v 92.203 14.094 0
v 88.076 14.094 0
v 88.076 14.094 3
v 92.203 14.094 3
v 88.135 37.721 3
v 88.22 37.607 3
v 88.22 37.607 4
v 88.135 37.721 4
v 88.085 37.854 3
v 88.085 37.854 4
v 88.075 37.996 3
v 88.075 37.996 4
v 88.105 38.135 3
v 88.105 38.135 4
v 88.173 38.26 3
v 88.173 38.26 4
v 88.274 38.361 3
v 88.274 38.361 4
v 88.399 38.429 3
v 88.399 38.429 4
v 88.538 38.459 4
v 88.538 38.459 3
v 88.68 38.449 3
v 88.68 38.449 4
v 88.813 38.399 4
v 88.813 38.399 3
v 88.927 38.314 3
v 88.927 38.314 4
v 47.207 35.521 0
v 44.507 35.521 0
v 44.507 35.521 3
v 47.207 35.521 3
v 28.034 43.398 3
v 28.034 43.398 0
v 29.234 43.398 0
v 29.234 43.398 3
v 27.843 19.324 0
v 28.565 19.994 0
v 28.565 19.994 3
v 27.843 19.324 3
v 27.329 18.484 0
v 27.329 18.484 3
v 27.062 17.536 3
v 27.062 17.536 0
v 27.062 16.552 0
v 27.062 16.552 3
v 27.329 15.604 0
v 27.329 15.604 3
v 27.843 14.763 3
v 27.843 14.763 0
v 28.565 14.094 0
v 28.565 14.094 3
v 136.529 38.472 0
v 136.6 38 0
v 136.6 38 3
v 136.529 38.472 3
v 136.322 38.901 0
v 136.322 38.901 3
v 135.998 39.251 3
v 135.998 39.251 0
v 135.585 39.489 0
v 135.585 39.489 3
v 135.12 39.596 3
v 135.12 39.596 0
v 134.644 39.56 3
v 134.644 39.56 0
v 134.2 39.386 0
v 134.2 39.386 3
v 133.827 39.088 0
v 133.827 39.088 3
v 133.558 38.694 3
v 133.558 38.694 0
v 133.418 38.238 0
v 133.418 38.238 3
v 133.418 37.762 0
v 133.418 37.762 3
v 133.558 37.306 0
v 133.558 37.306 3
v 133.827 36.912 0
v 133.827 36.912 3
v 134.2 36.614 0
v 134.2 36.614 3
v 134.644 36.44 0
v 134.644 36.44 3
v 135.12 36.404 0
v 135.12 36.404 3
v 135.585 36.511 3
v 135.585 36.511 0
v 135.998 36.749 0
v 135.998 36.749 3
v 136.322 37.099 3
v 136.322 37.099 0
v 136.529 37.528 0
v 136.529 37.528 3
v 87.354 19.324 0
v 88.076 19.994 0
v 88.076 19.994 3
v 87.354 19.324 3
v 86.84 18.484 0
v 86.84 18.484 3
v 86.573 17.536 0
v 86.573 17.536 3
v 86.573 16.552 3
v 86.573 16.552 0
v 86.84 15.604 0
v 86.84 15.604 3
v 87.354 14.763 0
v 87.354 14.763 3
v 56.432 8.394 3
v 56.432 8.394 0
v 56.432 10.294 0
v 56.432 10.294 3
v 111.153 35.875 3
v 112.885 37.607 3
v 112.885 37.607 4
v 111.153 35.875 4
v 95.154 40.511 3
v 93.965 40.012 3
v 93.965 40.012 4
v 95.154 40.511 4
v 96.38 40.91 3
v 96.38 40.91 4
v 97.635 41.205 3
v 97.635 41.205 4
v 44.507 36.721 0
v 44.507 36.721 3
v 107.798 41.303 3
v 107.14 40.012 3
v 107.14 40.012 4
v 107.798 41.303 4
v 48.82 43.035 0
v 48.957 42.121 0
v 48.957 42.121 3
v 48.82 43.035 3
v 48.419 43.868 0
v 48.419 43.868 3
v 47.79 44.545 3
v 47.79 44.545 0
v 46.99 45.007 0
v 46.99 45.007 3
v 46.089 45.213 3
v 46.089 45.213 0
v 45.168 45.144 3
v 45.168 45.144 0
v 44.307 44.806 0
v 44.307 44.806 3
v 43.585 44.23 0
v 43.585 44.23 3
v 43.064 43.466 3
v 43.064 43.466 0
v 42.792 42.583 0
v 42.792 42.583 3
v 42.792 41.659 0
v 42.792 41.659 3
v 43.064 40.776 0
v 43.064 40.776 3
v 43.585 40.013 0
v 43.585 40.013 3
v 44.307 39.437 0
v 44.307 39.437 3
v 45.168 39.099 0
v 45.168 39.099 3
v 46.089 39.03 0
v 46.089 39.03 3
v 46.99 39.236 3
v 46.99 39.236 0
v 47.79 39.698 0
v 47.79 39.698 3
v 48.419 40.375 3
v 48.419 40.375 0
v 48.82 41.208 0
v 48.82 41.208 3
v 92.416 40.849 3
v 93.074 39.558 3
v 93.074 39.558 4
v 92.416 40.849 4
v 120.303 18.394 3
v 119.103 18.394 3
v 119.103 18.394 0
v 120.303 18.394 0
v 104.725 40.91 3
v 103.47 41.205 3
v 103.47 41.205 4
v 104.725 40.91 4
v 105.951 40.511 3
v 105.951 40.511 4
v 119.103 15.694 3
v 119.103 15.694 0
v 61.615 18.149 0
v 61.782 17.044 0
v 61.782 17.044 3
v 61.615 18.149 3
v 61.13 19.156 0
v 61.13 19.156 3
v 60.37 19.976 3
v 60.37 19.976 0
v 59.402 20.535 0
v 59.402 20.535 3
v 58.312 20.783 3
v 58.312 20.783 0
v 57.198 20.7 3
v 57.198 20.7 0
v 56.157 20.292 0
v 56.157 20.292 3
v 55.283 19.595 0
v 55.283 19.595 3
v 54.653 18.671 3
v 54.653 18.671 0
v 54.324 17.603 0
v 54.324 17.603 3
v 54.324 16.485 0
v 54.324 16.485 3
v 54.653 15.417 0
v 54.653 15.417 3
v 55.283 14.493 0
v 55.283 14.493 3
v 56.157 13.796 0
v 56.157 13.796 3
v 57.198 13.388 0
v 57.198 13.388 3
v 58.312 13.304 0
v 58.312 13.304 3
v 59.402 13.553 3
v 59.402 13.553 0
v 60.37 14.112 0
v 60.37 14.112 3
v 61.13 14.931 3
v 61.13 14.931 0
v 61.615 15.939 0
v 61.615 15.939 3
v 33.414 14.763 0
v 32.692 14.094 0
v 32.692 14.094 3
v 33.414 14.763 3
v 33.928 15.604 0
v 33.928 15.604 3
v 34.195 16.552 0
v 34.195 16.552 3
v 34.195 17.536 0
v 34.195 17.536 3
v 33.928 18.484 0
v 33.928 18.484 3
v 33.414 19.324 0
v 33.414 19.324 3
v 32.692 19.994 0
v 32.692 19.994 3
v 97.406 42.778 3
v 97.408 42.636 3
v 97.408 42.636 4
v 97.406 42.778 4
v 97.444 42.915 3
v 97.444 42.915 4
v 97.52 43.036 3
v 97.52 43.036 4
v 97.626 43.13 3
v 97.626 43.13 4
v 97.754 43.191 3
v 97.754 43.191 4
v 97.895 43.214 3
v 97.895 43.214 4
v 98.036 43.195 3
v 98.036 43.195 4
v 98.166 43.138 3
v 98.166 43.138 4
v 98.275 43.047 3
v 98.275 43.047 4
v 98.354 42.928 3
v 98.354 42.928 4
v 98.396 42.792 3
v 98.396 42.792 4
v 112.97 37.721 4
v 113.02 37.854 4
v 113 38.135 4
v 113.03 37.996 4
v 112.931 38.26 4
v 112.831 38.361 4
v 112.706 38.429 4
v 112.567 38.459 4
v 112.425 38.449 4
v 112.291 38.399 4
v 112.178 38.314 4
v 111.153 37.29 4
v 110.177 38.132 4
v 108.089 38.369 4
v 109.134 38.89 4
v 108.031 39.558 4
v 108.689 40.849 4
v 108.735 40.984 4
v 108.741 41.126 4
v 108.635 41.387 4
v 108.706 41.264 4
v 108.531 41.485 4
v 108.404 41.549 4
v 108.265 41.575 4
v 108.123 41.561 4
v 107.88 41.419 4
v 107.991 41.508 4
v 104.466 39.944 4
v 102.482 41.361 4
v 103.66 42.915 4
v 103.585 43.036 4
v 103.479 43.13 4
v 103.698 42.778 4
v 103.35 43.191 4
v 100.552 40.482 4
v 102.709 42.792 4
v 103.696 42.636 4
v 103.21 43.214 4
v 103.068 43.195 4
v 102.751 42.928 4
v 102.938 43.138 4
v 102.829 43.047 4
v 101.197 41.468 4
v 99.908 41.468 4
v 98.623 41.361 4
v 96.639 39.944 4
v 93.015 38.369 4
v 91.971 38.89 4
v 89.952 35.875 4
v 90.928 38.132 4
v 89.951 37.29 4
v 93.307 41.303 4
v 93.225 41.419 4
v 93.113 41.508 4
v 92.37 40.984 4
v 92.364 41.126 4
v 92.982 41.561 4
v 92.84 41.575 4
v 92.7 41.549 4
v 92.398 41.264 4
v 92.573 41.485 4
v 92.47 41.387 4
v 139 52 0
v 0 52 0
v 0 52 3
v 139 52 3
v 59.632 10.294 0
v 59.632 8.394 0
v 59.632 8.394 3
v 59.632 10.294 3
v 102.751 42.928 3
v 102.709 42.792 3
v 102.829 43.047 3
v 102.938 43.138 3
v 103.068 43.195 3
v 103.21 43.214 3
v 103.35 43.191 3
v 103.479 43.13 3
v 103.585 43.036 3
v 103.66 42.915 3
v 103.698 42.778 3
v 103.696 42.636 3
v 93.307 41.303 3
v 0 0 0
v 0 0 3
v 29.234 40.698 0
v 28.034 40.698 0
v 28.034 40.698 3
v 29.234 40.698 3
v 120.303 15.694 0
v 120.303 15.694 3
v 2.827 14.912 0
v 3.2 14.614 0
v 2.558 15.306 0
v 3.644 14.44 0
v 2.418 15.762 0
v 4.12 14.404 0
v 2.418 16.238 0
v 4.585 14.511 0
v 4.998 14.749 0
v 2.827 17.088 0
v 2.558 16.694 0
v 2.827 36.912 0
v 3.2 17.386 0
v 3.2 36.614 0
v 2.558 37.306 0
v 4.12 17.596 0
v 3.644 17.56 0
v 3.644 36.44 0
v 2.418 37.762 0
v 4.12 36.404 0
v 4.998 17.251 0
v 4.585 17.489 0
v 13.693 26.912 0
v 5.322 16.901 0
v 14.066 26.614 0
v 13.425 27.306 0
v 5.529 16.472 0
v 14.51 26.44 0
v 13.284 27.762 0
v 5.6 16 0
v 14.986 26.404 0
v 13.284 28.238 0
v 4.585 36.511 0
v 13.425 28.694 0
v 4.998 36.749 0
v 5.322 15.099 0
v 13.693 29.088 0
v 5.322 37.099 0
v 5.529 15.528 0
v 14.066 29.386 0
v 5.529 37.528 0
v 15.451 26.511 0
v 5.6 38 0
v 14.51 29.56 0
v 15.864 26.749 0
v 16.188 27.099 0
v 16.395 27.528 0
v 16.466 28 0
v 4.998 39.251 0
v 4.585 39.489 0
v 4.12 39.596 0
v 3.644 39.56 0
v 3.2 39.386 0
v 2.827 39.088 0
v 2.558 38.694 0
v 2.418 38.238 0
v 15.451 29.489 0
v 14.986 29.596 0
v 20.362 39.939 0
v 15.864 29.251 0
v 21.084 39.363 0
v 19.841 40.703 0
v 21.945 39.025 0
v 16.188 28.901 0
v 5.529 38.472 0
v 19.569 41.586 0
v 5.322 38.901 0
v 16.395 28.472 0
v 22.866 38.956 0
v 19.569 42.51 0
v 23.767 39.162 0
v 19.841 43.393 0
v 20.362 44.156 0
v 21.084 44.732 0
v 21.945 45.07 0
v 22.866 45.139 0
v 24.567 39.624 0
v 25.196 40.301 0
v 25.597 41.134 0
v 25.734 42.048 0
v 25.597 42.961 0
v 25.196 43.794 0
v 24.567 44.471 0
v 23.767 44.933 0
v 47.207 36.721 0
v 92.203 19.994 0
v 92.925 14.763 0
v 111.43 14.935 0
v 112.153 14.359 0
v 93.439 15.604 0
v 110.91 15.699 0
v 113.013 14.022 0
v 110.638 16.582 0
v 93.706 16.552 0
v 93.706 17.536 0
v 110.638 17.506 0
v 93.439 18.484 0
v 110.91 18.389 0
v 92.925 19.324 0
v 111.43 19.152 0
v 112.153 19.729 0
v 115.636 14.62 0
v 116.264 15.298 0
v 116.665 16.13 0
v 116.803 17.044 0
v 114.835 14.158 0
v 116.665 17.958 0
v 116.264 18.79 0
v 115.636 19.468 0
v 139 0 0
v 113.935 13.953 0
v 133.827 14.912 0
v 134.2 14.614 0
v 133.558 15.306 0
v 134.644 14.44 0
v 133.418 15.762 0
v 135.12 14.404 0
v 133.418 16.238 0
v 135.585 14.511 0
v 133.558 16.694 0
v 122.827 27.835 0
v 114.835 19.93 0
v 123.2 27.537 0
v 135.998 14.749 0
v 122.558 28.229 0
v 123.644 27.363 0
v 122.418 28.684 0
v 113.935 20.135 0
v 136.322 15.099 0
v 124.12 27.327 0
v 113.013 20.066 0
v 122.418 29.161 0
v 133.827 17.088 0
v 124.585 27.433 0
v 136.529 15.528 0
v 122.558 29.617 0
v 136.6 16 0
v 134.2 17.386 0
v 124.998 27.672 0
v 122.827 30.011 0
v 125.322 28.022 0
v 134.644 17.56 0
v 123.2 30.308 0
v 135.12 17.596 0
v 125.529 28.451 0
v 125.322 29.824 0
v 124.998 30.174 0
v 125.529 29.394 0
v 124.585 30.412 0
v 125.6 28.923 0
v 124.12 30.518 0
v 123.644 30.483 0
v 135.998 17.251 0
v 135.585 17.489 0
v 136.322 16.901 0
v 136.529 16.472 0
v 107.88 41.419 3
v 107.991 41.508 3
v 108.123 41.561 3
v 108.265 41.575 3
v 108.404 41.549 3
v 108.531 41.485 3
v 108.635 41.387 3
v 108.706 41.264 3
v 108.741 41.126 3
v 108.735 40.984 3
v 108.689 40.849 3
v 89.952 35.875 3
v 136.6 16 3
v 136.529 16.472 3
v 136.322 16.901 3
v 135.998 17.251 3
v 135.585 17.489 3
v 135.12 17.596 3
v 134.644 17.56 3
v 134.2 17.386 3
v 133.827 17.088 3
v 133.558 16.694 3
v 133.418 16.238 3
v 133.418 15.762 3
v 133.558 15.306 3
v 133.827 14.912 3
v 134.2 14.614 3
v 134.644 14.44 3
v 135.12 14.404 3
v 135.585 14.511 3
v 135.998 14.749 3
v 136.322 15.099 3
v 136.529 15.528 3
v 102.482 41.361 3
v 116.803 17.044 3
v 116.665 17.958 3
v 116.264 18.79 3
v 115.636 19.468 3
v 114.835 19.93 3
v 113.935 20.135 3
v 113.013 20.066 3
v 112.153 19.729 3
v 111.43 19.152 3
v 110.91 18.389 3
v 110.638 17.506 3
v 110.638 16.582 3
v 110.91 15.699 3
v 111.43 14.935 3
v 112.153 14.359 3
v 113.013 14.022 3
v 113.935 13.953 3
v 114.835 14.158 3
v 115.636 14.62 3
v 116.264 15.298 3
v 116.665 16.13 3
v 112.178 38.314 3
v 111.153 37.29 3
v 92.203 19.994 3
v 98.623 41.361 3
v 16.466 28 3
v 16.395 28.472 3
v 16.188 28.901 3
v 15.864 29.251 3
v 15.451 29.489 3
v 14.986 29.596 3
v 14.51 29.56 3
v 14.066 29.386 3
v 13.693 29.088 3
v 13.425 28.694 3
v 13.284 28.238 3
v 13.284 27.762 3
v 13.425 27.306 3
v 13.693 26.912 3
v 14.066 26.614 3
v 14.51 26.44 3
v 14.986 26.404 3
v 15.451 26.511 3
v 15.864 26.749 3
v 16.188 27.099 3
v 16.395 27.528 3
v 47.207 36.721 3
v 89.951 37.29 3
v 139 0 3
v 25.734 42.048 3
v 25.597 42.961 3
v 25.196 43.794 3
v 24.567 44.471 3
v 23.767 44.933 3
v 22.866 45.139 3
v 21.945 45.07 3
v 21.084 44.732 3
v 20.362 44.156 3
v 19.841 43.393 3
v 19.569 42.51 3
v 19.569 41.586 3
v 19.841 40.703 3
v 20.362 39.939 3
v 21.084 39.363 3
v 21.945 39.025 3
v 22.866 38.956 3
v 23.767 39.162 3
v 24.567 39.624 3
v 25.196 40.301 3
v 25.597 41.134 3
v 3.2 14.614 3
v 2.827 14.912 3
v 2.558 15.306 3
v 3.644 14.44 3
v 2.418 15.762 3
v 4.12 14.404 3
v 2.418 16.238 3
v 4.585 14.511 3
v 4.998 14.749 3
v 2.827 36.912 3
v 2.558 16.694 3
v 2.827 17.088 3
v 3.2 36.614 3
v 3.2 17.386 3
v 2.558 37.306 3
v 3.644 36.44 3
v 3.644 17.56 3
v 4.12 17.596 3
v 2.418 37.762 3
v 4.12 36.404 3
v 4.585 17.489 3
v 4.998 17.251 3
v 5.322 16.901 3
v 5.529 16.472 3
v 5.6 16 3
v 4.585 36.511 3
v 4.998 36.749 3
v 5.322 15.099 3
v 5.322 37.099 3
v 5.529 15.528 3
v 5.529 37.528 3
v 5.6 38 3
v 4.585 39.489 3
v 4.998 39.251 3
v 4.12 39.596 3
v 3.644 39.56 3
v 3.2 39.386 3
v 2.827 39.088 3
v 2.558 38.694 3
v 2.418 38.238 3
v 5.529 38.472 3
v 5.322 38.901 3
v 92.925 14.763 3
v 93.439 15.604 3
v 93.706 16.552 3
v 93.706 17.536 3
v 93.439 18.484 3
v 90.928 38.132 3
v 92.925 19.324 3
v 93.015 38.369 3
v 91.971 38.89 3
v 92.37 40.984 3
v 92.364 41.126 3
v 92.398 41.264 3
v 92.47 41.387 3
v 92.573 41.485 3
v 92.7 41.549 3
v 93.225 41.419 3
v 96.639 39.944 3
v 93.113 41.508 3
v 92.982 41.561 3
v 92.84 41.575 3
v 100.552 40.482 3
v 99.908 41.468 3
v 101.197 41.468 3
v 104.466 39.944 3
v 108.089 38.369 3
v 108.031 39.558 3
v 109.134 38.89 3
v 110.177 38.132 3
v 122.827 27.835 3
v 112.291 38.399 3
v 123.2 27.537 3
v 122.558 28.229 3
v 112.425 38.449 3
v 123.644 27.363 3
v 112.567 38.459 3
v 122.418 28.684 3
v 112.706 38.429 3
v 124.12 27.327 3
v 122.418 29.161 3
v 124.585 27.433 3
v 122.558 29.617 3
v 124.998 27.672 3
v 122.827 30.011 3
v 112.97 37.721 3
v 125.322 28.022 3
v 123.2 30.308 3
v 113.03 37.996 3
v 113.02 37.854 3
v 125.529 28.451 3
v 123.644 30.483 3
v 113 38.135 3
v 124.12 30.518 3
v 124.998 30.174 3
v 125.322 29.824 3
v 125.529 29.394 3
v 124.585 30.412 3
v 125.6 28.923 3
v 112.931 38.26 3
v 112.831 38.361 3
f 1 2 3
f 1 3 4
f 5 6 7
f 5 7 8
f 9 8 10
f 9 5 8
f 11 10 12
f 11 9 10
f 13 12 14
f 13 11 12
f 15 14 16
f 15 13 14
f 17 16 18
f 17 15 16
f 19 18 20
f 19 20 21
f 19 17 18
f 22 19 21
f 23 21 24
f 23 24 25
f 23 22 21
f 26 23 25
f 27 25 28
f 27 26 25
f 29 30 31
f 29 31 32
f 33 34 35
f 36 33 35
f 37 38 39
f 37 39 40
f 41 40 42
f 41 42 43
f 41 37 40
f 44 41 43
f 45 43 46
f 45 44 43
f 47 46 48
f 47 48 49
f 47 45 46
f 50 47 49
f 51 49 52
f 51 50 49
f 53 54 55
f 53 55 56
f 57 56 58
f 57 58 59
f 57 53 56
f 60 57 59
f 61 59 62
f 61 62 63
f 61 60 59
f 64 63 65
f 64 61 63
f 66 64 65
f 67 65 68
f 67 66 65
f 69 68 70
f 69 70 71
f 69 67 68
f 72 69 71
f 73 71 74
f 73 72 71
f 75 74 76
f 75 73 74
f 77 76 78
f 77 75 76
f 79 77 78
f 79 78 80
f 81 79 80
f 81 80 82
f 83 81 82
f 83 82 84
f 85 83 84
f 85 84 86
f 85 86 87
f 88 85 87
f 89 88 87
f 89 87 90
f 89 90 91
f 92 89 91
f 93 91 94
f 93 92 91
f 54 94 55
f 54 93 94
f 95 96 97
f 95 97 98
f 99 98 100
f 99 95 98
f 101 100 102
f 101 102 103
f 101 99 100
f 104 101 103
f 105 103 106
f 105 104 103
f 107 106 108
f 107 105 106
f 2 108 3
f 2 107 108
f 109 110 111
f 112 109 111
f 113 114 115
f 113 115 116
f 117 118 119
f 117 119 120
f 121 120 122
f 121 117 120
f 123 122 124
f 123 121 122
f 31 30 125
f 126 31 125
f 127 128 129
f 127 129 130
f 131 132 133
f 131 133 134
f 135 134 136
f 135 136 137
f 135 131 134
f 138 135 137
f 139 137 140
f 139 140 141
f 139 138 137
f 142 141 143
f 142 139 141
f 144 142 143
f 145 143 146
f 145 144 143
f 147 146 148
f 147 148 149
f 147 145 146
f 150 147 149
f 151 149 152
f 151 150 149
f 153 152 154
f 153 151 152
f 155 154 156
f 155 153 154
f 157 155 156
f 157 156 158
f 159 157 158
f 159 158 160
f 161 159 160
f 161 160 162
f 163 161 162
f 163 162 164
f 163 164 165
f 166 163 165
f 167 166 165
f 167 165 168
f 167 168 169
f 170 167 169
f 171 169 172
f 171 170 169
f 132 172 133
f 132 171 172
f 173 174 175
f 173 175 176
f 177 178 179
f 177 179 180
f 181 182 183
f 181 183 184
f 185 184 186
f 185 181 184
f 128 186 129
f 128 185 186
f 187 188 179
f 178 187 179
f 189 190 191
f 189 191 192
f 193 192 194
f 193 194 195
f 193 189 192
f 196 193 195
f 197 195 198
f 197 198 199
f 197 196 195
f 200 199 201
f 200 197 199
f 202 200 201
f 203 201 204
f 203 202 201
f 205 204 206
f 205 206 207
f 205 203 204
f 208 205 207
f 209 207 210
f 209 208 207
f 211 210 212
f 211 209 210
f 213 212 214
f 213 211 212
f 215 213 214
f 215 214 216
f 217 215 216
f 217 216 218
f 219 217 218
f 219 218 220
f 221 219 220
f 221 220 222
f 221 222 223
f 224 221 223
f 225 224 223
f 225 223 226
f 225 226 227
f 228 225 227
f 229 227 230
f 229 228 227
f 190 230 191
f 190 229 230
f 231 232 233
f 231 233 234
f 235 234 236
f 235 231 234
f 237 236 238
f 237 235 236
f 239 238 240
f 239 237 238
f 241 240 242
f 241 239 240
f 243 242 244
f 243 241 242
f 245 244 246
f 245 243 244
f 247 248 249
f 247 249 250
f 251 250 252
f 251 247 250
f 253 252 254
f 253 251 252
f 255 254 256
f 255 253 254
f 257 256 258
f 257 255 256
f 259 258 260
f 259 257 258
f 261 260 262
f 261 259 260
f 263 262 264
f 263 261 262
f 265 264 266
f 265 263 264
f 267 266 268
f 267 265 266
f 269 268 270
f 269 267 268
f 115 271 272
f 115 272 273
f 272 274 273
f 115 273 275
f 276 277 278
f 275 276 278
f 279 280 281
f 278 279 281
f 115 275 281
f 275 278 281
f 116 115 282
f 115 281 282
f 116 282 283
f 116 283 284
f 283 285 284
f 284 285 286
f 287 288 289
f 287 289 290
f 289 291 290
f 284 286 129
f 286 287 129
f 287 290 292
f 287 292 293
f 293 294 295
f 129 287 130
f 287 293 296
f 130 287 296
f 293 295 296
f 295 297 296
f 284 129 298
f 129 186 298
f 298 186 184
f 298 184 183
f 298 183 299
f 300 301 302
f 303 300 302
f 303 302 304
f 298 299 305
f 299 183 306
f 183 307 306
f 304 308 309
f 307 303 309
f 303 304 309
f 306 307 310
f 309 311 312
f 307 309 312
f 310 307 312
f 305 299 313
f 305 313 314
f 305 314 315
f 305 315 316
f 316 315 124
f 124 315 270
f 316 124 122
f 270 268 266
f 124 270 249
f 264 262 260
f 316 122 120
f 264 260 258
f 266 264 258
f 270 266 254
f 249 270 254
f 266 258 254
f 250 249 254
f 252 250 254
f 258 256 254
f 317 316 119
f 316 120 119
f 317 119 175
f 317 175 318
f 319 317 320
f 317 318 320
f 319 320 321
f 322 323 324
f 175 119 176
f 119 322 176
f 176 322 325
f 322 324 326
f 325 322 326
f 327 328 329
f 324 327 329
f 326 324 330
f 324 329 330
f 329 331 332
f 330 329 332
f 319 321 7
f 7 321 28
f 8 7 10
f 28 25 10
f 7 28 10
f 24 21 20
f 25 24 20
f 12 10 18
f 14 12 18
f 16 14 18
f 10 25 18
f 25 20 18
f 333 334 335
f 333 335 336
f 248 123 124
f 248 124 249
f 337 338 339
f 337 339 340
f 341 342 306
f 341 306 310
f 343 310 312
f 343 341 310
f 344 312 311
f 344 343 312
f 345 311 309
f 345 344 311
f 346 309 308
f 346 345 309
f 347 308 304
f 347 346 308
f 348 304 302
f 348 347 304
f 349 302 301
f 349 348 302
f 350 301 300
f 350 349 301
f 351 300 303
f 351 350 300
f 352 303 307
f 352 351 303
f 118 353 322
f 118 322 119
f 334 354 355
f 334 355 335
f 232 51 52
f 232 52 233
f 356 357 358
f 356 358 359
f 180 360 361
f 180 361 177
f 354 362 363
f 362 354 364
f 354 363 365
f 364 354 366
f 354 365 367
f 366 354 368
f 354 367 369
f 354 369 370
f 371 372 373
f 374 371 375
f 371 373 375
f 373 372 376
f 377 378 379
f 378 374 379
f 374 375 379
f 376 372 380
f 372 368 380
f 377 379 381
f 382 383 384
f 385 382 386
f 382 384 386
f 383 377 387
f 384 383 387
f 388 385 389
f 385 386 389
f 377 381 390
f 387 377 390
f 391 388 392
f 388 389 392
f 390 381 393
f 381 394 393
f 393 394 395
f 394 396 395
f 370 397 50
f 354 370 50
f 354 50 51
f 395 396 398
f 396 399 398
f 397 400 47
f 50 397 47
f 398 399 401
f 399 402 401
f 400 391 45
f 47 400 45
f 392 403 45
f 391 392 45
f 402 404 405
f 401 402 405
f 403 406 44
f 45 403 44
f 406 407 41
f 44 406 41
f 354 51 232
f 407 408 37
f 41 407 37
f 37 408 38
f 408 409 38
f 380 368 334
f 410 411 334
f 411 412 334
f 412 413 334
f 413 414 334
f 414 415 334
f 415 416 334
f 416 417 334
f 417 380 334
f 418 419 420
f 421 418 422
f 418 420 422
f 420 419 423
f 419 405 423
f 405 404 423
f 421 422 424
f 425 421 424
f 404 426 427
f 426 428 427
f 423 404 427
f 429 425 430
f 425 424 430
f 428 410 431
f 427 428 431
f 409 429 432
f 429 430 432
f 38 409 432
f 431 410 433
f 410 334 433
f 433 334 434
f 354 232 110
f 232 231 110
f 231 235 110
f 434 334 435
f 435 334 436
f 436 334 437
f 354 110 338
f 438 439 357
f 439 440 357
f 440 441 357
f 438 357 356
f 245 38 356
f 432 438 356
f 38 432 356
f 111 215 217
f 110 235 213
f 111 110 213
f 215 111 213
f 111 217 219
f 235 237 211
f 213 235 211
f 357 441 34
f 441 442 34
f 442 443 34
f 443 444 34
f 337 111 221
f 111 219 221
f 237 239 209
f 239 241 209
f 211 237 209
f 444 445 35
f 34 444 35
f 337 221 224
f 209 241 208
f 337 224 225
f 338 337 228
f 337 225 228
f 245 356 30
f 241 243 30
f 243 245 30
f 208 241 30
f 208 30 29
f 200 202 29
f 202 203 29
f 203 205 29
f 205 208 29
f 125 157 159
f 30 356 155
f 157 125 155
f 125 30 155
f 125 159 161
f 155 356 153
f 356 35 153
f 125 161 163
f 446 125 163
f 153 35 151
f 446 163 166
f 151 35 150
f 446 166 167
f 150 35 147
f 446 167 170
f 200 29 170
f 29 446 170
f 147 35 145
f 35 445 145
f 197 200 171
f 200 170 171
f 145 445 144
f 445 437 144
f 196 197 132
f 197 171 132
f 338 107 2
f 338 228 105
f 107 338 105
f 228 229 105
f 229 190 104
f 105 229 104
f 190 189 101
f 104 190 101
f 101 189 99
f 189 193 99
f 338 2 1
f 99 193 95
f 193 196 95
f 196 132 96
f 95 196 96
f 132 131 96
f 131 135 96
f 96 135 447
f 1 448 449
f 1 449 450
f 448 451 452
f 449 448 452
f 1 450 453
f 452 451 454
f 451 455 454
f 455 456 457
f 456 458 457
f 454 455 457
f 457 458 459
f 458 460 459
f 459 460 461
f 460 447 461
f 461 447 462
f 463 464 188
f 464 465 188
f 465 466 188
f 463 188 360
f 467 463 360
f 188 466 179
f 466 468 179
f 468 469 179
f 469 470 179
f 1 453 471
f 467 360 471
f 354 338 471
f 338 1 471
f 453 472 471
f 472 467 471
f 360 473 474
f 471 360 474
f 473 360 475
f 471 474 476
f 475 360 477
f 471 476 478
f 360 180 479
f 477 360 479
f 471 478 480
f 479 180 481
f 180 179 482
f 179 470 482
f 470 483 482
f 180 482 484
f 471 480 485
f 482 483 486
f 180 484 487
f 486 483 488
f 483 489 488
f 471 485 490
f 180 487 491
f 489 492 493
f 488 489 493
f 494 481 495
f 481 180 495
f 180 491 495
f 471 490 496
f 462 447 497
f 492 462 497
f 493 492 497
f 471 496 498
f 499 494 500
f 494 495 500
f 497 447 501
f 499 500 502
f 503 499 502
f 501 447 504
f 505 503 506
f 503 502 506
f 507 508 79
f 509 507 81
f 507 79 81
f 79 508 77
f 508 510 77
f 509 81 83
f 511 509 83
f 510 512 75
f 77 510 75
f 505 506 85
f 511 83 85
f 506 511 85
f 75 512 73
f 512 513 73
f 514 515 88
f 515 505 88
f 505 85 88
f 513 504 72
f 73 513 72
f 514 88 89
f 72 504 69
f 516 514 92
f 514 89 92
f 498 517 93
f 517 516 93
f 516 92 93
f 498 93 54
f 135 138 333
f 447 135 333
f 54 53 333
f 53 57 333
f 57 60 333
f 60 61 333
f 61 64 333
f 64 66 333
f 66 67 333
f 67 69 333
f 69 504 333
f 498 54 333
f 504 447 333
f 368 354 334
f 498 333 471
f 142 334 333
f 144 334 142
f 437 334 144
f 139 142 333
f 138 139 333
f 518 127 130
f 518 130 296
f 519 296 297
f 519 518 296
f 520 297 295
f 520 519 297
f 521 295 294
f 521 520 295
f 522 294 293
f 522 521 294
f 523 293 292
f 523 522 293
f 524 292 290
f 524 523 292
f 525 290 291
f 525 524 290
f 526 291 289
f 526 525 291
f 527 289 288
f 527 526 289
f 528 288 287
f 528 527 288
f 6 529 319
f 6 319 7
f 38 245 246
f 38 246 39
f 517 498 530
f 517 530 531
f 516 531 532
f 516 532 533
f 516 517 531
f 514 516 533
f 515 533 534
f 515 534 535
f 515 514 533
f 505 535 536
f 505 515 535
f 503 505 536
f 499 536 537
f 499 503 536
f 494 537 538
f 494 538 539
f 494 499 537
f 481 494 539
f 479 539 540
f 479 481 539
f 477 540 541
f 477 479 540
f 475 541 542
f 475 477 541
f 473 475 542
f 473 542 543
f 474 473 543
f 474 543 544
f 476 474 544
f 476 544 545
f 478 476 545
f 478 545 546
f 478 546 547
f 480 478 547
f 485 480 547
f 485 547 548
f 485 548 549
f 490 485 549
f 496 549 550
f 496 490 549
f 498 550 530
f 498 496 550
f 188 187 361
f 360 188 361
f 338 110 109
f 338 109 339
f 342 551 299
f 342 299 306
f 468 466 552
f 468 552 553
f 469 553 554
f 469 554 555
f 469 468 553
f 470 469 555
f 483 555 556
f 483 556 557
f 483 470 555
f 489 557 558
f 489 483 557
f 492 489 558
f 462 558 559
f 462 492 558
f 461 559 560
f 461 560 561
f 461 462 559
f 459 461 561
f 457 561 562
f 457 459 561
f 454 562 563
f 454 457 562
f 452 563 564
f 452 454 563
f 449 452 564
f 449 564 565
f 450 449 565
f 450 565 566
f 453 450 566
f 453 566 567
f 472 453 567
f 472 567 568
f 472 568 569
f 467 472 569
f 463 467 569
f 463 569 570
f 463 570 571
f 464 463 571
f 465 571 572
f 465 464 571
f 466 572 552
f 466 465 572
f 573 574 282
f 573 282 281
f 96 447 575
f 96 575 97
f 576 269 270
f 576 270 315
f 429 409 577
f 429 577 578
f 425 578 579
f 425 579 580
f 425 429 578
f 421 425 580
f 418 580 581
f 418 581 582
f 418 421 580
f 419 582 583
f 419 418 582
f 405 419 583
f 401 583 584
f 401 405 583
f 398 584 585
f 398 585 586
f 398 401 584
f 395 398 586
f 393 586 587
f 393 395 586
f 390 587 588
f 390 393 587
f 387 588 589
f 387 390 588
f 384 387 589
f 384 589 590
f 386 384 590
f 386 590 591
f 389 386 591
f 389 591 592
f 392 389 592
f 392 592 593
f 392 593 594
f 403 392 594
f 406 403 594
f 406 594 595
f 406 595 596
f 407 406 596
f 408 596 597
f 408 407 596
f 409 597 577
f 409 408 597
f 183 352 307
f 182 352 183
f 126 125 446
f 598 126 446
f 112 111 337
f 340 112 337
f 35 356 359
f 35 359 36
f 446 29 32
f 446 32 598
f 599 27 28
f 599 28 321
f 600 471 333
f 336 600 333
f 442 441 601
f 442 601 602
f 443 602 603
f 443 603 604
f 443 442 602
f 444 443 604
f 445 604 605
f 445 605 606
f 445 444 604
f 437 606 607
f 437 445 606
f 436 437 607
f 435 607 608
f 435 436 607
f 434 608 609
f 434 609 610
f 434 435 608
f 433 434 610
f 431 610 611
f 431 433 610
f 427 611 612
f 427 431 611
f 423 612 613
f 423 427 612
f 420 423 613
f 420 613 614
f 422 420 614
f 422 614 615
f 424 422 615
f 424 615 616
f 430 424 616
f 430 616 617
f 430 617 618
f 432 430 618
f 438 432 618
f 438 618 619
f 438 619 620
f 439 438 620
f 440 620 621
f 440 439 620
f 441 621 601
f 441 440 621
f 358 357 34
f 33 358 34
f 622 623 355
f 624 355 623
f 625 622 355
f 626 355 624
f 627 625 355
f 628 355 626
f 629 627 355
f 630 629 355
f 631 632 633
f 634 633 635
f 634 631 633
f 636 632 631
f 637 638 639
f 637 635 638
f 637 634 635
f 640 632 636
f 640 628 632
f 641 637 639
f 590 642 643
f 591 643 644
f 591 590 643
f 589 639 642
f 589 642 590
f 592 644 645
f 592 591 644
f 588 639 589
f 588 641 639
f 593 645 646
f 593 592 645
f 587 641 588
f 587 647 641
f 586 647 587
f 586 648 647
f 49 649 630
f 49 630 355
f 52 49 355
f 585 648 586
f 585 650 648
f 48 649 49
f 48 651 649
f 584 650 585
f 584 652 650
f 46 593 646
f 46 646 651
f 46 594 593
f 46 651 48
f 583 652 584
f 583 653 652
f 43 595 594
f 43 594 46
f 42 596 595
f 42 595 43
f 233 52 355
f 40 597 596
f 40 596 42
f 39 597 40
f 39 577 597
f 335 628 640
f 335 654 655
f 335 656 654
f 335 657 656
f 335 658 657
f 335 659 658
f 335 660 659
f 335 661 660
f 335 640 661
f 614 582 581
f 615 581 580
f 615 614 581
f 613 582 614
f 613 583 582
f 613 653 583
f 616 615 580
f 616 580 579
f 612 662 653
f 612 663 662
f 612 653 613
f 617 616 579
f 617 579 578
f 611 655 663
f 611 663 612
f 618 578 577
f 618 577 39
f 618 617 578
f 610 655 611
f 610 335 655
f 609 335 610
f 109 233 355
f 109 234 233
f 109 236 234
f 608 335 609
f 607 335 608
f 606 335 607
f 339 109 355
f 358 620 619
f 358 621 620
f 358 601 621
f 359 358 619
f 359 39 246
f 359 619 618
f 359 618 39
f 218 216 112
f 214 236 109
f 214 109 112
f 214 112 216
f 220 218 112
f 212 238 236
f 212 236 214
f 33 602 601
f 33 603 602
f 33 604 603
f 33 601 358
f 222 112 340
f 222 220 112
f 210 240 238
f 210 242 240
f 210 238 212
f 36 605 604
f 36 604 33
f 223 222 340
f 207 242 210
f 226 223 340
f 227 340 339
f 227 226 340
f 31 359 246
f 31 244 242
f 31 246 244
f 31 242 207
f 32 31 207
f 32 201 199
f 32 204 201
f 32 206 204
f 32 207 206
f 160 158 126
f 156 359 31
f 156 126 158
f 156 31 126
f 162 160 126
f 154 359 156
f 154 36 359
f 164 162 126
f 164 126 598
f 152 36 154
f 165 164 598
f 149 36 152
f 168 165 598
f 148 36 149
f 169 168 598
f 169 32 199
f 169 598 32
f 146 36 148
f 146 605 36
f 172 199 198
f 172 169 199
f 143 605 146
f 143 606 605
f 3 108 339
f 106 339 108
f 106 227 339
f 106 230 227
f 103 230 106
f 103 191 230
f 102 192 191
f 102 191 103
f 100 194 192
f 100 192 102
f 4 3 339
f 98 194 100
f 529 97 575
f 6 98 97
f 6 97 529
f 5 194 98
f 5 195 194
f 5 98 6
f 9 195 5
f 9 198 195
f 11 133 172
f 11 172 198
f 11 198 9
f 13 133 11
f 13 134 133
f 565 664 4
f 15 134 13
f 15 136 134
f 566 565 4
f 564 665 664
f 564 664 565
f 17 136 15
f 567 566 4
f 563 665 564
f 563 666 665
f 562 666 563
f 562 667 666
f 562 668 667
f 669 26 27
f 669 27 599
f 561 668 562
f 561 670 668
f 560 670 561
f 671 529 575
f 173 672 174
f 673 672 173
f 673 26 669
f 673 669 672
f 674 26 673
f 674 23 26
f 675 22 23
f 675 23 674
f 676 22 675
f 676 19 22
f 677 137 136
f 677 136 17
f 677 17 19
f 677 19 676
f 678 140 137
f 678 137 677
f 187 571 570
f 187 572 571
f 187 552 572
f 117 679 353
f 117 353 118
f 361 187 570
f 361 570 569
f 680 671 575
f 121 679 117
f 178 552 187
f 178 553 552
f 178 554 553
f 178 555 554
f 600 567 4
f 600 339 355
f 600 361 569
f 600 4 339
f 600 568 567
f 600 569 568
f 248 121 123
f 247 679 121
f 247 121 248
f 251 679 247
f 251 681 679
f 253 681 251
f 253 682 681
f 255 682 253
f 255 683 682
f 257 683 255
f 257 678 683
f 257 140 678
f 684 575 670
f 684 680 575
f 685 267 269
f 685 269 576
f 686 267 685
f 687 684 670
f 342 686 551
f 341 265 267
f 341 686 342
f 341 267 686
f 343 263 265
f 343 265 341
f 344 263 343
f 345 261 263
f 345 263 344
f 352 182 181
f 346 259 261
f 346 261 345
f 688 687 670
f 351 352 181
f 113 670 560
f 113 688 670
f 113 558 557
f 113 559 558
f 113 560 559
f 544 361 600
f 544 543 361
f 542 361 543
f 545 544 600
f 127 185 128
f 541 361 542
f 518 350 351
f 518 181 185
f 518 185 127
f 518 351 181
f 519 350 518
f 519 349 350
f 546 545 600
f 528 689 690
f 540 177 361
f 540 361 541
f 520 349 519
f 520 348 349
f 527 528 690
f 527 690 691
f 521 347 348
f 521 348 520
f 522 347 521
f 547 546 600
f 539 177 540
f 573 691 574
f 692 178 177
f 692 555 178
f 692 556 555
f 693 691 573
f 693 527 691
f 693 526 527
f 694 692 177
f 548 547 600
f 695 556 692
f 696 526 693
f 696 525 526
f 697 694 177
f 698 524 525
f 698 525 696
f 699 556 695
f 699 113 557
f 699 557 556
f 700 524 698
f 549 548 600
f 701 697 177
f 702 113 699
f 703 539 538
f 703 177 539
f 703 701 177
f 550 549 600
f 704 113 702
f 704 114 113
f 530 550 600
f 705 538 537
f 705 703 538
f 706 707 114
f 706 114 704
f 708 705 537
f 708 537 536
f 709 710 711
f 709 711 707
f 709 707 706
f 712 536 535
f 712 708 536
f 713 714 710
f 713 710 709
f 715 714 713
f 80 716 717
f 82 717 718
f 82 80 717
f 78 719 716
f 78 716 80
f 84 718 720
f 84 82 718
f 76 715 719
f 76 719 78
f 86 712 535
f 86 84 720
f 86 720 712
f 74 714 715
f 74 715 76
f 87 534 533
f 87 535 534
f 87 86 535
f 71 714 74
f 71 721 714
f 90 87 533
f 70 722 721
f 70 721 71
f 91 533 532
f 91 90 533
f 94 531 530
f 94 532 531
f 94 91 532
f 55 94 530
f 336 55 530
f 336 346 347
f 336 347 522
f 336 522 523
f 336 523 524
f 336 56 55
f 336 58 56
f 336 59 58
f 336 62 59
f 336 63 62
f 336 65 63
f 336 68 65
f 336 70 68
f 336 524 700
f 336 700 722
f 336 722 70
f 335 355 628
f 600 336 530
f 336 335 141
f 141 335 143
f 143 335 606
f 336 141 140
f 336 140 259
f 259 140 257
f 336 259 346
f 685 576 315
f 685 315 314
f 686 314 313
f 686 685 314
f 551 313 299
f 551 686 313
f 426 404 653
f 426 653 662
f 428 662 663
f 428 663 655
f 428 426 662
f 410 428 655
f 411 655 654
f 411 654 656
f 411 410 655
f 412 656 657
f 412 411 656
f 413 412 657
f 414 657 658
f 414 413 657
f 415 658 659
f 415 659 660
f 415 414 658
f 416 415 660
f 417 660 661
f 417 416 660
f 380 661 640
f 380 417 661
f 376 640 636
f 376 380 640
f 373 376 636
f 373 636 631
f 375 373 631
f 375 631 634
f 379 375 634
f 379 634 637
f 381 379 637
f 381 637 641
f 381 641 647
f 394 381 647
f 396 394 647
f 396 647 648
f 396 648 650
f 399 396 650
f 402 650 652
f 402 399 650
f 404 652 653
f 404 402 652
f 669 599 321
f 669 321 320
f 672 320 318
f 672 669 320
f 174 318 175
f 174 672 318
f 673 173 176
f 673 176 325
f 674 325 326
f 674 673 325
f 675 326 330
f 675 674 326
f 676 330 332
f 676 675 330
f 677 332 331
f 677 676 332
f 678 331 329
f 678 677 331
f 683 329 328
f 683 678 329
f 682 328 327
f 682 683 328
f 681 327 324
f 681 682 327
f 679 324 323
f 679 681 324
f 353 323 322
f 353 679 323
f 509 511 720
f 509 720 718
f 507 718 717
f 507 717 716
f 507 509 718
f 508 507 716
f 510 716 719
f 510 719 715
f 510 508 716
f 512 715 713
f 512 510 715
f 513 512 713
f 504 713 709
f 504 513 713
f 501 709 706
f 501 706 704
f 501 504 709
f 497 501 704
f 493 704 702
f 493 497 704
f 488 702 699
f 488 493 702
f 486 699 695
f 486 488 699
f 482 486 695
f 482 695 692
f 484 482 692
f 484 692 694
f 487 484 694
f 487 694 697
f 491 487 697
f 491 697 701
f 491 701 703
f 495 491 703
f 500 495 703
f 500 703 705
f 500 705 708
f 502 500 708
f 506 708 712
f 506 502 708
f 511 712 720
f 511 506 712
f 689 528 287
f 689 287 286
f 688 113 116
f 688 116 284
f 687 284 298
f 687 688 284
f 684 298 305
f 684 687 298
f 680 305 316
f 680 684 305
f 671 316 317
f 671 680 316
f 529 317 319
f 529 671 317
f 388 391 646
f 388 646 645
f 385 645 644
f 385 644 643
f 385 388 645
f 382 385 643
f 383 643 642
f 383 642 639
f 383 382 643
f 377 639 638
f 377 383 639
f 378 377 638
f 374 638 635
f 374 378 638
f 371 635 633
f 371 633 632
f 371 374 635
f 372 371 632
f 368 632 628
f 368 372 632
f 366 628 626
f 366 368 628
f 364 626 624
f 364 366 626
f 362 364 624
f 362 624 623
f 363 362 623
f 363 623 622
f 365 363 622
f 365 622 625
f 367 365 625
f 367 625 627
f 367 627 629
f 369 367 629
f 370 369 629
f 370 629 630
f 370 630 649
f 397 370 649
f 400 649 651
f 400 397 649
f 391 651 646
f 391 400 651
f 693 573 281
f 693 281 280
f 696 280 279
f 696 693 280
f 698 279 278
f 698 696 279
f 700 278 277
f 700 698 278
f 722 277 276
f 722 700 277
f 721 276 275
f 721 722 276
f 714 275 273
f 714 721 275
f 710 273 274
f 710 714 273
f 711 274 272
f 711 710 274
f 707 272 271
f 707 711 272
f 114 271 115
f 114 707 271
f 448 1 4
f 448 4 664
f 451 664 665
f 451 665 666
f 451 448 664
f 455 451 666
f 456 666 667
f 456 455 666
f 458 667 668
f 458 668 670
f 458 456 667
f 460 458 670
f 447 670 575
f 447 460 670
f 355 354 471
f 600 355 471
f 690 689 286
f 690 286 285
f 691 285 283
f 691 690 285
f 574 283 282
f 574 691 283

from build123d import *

# Parameters (mm, degrees)
SKETCH1_W           = 139
SKETCH1_H           = 52
SKETCH1_R           = 3.1
SKETCH1_R_2         = 1.6
SKETCH1_R_3         = 3.75
SKETCH1_W_2         = 3.2
SKETCH1_H_2         = 1.9
SKETCH1_W_3         = 1.2
SKETCH1_H_3         = 2.7
SKETCH1_W_4         = 2.7
SKETCH1_H_4         = 1.2
BOSS_EXTRUDE1_DEPTH = 3
BOSS_EXTRUDE2_DEPTH = 1


with BuildPart() as part:
    # Sketch1 → Boss-Extrude1 (new body)
    with BuildSketch(Plane.XY):
        with Locations((69.5, 26)):
            Rectangle(SKETCH1_W, SKETCH1_H)
        with Locations((22.634375474, 42.047579972)):
            Circle(SKETCH1_R, mode=Mode.SUBTRACT)
        with Locations((4, 38)):
            Circle(SKETCH1_R_2, mode=Mode.SUBTRACT)
        with Locations((135, 38)):
            Circle(SKETCH1_R_2, mode=Mode.SUBTRACT)
        with Locations((135, 16)):
            Circle(SKETCH1_R_2, mode=Mode.SUBTRACT)
        with Locations((4, 16)):
            Circle(SKETCH1_R_2, mode=Mode.SUBTRACT)
        with Locations((14.866068747, 28)):
            Circle(SKETCH1_R_2, mode=Mode.SUBTRACT)
        with Locations((124, 28.922858178)):
            Circle(SKETCH1_R_2, mode=Mode.SUBTRACT)
        with Locations((58.031961536, 17.043942087)):
            Circle(SKETCH1_R_3, mode=Mode.SUBTRACT)
        with Locations((45.857489394, 42.12137557)):
            Circle(SKETCH1_R, mode=Mode.SUBTRACT)
        with Locations((113.702920713, 17.043942087)):
            Circle(SKETCH1_R, mode=Mode.SUBTRACT)
        with Locations((58.031961536, 9.343942087)):
            Rectangle(SKETCH1_W_2, SKETCH1_H_2, mode=Mode.SUBTRACT)
        with Locations((28.634375474, 42.047579972)):
            Rectangle(SKETCH1_W_3, SKETCH1_H_3, mode=Mode.SUBTRACT)
        with BuildLine():
            Line((88.076124719, 14.093942087), (92.202866775, 14.093942087))
            ThreePointArc((92.202866775, 14.093942087), (93.739495747, 17.043942087), (92.202866775, 19.993942087))
            Line((92.202866775, 19.993942087), (88.076124719, 19.993942087))
            ThreePointArc((88.076124719, 19.993942087), (86.539495747, 17.043942087), (88.076124719, 14.093942087))
        make_face(mode=Mode.SUBTRACT)
        with Locations((45.857489394, 36.12137557)):
            Rectangle(SKETCH1_W_4, SKETCH1_H_4, mode=Mode.SUBTRACT)
        with BuildLine():
            Line((28.564994968, 14.093942087), (32.691737024, 14.093942087))
            ThreePointArc((32.691737024, 14.093942087), (34.228365996, 17.043942087), (32.691737024, 19.993942087))
            Line((32.691737024, 19.993942087), (28.564994968, 19.993942087))
            ThreePointArc((28.564994968, 19.993942087), (27.028365996, 17.043942087), (28.564994968, 14.093942087))
        make_face(mode=Mode.SUBTRACT)
        with Locations((119.702920713, 17.043942087)):
            Rectangle(SKETCH1_W_3, SKETCH1_H_3, mode=Mode.SUBTRACT)
    extrude(amount=BOSS_EXTRUDE1_DEPTH)

    # Sketch2 → Boss-Extrude2 (add)
    with BuildSketch(Plane.XY.offset(3)):
        with BuildLine():
            Line((111.153182821, 37.289690551), (112.17756564, 38.314073369))
            ThreePointArc((112.17756564, 38.314073369), (112.884672421, 38.314073369), (112.884672421, 37.606966588))
            Line((112.884672421, 37.606966588), (111.152789219, 35.875083385))
            ThreePointArc((111.152789219, 35.875083385), (100.552285062, 40.48168601), (89.951780905, 35.875083385))
            Line((89.951780905, 35.875083385), (88.219897703, 37.606966588))
            ThreePointArc((88.219897703, 37.606966588), (88.219897703, 38.314073369), (88.927004484, 38.314073369))
            Line((88.927004484, 38.314073369), (89.951387302, 37.289690551))
            ThreePointArc((89.951387302, 37.289690551), (91.441613651, 38.521449423), (93.073591221, 39.558104478))
            Line((93.073591221, 39.558104478), (92.415896966, 40.848902132))
            ThreePointArc((92.415896966, 40.848902132), (92.634404978, 41.521400644), (93.30690349, 41.302892632))
            Line((93.30690349, 41.302892632), (93.964597745, 40.012094978))
            ThreePointArc((93.964597745, 40.012094978), (95.762521649, 40.723062012), (97.63496858, 41.204670755))
            Line((97.63496858, 41.204670755), (97.408342585, 42.635530977))
            ThreePointArc((97.408342585, 42.635530977), (97.823969523, 43.20759238), (98.396030925, 42.791965442))
            Line((98.396030925, 42.791965442), (98.622656921, 41.36110522))
            ThreePointArc((98.622656921, 41.36110522), (100.552285062, 41.48168601), (102.481913203, 41.36110522))
            Line((102.481913203, 41.36110522), (102.708539199, 42.791965442))
            ThreePointArc((102.708539199, 42.791965442), (103.280600601, 43.20759238), (103.696227539, 42.635530977))
            Line((103.696227539, 42.635530977), (103.469601544, 41.204670755))
            ThreePointArc((103.469601544, 41.204670755), (105.342048475, 40.723062012), (107.139972379, 40.012094978))
            Line((107.139972379, 40.012094978), (107.797666634, 41.302892632))
            ThreePointArc((107.797666634, 41.302892632), (108.470165146, 41.521400644), (108.688673158, 40.848902132))
            Line((108.688673158, 40.848902132), (108.030978903, 39.558104478))
            ThreePointArc((108.030978903, 39.558104478), (109.662956473, 38.521449423), (111.153182821, 37.289690551))
        make_face()
    extrude(amount=BOSS_EXTRUDE2_DEPTH)


solid = part.part
